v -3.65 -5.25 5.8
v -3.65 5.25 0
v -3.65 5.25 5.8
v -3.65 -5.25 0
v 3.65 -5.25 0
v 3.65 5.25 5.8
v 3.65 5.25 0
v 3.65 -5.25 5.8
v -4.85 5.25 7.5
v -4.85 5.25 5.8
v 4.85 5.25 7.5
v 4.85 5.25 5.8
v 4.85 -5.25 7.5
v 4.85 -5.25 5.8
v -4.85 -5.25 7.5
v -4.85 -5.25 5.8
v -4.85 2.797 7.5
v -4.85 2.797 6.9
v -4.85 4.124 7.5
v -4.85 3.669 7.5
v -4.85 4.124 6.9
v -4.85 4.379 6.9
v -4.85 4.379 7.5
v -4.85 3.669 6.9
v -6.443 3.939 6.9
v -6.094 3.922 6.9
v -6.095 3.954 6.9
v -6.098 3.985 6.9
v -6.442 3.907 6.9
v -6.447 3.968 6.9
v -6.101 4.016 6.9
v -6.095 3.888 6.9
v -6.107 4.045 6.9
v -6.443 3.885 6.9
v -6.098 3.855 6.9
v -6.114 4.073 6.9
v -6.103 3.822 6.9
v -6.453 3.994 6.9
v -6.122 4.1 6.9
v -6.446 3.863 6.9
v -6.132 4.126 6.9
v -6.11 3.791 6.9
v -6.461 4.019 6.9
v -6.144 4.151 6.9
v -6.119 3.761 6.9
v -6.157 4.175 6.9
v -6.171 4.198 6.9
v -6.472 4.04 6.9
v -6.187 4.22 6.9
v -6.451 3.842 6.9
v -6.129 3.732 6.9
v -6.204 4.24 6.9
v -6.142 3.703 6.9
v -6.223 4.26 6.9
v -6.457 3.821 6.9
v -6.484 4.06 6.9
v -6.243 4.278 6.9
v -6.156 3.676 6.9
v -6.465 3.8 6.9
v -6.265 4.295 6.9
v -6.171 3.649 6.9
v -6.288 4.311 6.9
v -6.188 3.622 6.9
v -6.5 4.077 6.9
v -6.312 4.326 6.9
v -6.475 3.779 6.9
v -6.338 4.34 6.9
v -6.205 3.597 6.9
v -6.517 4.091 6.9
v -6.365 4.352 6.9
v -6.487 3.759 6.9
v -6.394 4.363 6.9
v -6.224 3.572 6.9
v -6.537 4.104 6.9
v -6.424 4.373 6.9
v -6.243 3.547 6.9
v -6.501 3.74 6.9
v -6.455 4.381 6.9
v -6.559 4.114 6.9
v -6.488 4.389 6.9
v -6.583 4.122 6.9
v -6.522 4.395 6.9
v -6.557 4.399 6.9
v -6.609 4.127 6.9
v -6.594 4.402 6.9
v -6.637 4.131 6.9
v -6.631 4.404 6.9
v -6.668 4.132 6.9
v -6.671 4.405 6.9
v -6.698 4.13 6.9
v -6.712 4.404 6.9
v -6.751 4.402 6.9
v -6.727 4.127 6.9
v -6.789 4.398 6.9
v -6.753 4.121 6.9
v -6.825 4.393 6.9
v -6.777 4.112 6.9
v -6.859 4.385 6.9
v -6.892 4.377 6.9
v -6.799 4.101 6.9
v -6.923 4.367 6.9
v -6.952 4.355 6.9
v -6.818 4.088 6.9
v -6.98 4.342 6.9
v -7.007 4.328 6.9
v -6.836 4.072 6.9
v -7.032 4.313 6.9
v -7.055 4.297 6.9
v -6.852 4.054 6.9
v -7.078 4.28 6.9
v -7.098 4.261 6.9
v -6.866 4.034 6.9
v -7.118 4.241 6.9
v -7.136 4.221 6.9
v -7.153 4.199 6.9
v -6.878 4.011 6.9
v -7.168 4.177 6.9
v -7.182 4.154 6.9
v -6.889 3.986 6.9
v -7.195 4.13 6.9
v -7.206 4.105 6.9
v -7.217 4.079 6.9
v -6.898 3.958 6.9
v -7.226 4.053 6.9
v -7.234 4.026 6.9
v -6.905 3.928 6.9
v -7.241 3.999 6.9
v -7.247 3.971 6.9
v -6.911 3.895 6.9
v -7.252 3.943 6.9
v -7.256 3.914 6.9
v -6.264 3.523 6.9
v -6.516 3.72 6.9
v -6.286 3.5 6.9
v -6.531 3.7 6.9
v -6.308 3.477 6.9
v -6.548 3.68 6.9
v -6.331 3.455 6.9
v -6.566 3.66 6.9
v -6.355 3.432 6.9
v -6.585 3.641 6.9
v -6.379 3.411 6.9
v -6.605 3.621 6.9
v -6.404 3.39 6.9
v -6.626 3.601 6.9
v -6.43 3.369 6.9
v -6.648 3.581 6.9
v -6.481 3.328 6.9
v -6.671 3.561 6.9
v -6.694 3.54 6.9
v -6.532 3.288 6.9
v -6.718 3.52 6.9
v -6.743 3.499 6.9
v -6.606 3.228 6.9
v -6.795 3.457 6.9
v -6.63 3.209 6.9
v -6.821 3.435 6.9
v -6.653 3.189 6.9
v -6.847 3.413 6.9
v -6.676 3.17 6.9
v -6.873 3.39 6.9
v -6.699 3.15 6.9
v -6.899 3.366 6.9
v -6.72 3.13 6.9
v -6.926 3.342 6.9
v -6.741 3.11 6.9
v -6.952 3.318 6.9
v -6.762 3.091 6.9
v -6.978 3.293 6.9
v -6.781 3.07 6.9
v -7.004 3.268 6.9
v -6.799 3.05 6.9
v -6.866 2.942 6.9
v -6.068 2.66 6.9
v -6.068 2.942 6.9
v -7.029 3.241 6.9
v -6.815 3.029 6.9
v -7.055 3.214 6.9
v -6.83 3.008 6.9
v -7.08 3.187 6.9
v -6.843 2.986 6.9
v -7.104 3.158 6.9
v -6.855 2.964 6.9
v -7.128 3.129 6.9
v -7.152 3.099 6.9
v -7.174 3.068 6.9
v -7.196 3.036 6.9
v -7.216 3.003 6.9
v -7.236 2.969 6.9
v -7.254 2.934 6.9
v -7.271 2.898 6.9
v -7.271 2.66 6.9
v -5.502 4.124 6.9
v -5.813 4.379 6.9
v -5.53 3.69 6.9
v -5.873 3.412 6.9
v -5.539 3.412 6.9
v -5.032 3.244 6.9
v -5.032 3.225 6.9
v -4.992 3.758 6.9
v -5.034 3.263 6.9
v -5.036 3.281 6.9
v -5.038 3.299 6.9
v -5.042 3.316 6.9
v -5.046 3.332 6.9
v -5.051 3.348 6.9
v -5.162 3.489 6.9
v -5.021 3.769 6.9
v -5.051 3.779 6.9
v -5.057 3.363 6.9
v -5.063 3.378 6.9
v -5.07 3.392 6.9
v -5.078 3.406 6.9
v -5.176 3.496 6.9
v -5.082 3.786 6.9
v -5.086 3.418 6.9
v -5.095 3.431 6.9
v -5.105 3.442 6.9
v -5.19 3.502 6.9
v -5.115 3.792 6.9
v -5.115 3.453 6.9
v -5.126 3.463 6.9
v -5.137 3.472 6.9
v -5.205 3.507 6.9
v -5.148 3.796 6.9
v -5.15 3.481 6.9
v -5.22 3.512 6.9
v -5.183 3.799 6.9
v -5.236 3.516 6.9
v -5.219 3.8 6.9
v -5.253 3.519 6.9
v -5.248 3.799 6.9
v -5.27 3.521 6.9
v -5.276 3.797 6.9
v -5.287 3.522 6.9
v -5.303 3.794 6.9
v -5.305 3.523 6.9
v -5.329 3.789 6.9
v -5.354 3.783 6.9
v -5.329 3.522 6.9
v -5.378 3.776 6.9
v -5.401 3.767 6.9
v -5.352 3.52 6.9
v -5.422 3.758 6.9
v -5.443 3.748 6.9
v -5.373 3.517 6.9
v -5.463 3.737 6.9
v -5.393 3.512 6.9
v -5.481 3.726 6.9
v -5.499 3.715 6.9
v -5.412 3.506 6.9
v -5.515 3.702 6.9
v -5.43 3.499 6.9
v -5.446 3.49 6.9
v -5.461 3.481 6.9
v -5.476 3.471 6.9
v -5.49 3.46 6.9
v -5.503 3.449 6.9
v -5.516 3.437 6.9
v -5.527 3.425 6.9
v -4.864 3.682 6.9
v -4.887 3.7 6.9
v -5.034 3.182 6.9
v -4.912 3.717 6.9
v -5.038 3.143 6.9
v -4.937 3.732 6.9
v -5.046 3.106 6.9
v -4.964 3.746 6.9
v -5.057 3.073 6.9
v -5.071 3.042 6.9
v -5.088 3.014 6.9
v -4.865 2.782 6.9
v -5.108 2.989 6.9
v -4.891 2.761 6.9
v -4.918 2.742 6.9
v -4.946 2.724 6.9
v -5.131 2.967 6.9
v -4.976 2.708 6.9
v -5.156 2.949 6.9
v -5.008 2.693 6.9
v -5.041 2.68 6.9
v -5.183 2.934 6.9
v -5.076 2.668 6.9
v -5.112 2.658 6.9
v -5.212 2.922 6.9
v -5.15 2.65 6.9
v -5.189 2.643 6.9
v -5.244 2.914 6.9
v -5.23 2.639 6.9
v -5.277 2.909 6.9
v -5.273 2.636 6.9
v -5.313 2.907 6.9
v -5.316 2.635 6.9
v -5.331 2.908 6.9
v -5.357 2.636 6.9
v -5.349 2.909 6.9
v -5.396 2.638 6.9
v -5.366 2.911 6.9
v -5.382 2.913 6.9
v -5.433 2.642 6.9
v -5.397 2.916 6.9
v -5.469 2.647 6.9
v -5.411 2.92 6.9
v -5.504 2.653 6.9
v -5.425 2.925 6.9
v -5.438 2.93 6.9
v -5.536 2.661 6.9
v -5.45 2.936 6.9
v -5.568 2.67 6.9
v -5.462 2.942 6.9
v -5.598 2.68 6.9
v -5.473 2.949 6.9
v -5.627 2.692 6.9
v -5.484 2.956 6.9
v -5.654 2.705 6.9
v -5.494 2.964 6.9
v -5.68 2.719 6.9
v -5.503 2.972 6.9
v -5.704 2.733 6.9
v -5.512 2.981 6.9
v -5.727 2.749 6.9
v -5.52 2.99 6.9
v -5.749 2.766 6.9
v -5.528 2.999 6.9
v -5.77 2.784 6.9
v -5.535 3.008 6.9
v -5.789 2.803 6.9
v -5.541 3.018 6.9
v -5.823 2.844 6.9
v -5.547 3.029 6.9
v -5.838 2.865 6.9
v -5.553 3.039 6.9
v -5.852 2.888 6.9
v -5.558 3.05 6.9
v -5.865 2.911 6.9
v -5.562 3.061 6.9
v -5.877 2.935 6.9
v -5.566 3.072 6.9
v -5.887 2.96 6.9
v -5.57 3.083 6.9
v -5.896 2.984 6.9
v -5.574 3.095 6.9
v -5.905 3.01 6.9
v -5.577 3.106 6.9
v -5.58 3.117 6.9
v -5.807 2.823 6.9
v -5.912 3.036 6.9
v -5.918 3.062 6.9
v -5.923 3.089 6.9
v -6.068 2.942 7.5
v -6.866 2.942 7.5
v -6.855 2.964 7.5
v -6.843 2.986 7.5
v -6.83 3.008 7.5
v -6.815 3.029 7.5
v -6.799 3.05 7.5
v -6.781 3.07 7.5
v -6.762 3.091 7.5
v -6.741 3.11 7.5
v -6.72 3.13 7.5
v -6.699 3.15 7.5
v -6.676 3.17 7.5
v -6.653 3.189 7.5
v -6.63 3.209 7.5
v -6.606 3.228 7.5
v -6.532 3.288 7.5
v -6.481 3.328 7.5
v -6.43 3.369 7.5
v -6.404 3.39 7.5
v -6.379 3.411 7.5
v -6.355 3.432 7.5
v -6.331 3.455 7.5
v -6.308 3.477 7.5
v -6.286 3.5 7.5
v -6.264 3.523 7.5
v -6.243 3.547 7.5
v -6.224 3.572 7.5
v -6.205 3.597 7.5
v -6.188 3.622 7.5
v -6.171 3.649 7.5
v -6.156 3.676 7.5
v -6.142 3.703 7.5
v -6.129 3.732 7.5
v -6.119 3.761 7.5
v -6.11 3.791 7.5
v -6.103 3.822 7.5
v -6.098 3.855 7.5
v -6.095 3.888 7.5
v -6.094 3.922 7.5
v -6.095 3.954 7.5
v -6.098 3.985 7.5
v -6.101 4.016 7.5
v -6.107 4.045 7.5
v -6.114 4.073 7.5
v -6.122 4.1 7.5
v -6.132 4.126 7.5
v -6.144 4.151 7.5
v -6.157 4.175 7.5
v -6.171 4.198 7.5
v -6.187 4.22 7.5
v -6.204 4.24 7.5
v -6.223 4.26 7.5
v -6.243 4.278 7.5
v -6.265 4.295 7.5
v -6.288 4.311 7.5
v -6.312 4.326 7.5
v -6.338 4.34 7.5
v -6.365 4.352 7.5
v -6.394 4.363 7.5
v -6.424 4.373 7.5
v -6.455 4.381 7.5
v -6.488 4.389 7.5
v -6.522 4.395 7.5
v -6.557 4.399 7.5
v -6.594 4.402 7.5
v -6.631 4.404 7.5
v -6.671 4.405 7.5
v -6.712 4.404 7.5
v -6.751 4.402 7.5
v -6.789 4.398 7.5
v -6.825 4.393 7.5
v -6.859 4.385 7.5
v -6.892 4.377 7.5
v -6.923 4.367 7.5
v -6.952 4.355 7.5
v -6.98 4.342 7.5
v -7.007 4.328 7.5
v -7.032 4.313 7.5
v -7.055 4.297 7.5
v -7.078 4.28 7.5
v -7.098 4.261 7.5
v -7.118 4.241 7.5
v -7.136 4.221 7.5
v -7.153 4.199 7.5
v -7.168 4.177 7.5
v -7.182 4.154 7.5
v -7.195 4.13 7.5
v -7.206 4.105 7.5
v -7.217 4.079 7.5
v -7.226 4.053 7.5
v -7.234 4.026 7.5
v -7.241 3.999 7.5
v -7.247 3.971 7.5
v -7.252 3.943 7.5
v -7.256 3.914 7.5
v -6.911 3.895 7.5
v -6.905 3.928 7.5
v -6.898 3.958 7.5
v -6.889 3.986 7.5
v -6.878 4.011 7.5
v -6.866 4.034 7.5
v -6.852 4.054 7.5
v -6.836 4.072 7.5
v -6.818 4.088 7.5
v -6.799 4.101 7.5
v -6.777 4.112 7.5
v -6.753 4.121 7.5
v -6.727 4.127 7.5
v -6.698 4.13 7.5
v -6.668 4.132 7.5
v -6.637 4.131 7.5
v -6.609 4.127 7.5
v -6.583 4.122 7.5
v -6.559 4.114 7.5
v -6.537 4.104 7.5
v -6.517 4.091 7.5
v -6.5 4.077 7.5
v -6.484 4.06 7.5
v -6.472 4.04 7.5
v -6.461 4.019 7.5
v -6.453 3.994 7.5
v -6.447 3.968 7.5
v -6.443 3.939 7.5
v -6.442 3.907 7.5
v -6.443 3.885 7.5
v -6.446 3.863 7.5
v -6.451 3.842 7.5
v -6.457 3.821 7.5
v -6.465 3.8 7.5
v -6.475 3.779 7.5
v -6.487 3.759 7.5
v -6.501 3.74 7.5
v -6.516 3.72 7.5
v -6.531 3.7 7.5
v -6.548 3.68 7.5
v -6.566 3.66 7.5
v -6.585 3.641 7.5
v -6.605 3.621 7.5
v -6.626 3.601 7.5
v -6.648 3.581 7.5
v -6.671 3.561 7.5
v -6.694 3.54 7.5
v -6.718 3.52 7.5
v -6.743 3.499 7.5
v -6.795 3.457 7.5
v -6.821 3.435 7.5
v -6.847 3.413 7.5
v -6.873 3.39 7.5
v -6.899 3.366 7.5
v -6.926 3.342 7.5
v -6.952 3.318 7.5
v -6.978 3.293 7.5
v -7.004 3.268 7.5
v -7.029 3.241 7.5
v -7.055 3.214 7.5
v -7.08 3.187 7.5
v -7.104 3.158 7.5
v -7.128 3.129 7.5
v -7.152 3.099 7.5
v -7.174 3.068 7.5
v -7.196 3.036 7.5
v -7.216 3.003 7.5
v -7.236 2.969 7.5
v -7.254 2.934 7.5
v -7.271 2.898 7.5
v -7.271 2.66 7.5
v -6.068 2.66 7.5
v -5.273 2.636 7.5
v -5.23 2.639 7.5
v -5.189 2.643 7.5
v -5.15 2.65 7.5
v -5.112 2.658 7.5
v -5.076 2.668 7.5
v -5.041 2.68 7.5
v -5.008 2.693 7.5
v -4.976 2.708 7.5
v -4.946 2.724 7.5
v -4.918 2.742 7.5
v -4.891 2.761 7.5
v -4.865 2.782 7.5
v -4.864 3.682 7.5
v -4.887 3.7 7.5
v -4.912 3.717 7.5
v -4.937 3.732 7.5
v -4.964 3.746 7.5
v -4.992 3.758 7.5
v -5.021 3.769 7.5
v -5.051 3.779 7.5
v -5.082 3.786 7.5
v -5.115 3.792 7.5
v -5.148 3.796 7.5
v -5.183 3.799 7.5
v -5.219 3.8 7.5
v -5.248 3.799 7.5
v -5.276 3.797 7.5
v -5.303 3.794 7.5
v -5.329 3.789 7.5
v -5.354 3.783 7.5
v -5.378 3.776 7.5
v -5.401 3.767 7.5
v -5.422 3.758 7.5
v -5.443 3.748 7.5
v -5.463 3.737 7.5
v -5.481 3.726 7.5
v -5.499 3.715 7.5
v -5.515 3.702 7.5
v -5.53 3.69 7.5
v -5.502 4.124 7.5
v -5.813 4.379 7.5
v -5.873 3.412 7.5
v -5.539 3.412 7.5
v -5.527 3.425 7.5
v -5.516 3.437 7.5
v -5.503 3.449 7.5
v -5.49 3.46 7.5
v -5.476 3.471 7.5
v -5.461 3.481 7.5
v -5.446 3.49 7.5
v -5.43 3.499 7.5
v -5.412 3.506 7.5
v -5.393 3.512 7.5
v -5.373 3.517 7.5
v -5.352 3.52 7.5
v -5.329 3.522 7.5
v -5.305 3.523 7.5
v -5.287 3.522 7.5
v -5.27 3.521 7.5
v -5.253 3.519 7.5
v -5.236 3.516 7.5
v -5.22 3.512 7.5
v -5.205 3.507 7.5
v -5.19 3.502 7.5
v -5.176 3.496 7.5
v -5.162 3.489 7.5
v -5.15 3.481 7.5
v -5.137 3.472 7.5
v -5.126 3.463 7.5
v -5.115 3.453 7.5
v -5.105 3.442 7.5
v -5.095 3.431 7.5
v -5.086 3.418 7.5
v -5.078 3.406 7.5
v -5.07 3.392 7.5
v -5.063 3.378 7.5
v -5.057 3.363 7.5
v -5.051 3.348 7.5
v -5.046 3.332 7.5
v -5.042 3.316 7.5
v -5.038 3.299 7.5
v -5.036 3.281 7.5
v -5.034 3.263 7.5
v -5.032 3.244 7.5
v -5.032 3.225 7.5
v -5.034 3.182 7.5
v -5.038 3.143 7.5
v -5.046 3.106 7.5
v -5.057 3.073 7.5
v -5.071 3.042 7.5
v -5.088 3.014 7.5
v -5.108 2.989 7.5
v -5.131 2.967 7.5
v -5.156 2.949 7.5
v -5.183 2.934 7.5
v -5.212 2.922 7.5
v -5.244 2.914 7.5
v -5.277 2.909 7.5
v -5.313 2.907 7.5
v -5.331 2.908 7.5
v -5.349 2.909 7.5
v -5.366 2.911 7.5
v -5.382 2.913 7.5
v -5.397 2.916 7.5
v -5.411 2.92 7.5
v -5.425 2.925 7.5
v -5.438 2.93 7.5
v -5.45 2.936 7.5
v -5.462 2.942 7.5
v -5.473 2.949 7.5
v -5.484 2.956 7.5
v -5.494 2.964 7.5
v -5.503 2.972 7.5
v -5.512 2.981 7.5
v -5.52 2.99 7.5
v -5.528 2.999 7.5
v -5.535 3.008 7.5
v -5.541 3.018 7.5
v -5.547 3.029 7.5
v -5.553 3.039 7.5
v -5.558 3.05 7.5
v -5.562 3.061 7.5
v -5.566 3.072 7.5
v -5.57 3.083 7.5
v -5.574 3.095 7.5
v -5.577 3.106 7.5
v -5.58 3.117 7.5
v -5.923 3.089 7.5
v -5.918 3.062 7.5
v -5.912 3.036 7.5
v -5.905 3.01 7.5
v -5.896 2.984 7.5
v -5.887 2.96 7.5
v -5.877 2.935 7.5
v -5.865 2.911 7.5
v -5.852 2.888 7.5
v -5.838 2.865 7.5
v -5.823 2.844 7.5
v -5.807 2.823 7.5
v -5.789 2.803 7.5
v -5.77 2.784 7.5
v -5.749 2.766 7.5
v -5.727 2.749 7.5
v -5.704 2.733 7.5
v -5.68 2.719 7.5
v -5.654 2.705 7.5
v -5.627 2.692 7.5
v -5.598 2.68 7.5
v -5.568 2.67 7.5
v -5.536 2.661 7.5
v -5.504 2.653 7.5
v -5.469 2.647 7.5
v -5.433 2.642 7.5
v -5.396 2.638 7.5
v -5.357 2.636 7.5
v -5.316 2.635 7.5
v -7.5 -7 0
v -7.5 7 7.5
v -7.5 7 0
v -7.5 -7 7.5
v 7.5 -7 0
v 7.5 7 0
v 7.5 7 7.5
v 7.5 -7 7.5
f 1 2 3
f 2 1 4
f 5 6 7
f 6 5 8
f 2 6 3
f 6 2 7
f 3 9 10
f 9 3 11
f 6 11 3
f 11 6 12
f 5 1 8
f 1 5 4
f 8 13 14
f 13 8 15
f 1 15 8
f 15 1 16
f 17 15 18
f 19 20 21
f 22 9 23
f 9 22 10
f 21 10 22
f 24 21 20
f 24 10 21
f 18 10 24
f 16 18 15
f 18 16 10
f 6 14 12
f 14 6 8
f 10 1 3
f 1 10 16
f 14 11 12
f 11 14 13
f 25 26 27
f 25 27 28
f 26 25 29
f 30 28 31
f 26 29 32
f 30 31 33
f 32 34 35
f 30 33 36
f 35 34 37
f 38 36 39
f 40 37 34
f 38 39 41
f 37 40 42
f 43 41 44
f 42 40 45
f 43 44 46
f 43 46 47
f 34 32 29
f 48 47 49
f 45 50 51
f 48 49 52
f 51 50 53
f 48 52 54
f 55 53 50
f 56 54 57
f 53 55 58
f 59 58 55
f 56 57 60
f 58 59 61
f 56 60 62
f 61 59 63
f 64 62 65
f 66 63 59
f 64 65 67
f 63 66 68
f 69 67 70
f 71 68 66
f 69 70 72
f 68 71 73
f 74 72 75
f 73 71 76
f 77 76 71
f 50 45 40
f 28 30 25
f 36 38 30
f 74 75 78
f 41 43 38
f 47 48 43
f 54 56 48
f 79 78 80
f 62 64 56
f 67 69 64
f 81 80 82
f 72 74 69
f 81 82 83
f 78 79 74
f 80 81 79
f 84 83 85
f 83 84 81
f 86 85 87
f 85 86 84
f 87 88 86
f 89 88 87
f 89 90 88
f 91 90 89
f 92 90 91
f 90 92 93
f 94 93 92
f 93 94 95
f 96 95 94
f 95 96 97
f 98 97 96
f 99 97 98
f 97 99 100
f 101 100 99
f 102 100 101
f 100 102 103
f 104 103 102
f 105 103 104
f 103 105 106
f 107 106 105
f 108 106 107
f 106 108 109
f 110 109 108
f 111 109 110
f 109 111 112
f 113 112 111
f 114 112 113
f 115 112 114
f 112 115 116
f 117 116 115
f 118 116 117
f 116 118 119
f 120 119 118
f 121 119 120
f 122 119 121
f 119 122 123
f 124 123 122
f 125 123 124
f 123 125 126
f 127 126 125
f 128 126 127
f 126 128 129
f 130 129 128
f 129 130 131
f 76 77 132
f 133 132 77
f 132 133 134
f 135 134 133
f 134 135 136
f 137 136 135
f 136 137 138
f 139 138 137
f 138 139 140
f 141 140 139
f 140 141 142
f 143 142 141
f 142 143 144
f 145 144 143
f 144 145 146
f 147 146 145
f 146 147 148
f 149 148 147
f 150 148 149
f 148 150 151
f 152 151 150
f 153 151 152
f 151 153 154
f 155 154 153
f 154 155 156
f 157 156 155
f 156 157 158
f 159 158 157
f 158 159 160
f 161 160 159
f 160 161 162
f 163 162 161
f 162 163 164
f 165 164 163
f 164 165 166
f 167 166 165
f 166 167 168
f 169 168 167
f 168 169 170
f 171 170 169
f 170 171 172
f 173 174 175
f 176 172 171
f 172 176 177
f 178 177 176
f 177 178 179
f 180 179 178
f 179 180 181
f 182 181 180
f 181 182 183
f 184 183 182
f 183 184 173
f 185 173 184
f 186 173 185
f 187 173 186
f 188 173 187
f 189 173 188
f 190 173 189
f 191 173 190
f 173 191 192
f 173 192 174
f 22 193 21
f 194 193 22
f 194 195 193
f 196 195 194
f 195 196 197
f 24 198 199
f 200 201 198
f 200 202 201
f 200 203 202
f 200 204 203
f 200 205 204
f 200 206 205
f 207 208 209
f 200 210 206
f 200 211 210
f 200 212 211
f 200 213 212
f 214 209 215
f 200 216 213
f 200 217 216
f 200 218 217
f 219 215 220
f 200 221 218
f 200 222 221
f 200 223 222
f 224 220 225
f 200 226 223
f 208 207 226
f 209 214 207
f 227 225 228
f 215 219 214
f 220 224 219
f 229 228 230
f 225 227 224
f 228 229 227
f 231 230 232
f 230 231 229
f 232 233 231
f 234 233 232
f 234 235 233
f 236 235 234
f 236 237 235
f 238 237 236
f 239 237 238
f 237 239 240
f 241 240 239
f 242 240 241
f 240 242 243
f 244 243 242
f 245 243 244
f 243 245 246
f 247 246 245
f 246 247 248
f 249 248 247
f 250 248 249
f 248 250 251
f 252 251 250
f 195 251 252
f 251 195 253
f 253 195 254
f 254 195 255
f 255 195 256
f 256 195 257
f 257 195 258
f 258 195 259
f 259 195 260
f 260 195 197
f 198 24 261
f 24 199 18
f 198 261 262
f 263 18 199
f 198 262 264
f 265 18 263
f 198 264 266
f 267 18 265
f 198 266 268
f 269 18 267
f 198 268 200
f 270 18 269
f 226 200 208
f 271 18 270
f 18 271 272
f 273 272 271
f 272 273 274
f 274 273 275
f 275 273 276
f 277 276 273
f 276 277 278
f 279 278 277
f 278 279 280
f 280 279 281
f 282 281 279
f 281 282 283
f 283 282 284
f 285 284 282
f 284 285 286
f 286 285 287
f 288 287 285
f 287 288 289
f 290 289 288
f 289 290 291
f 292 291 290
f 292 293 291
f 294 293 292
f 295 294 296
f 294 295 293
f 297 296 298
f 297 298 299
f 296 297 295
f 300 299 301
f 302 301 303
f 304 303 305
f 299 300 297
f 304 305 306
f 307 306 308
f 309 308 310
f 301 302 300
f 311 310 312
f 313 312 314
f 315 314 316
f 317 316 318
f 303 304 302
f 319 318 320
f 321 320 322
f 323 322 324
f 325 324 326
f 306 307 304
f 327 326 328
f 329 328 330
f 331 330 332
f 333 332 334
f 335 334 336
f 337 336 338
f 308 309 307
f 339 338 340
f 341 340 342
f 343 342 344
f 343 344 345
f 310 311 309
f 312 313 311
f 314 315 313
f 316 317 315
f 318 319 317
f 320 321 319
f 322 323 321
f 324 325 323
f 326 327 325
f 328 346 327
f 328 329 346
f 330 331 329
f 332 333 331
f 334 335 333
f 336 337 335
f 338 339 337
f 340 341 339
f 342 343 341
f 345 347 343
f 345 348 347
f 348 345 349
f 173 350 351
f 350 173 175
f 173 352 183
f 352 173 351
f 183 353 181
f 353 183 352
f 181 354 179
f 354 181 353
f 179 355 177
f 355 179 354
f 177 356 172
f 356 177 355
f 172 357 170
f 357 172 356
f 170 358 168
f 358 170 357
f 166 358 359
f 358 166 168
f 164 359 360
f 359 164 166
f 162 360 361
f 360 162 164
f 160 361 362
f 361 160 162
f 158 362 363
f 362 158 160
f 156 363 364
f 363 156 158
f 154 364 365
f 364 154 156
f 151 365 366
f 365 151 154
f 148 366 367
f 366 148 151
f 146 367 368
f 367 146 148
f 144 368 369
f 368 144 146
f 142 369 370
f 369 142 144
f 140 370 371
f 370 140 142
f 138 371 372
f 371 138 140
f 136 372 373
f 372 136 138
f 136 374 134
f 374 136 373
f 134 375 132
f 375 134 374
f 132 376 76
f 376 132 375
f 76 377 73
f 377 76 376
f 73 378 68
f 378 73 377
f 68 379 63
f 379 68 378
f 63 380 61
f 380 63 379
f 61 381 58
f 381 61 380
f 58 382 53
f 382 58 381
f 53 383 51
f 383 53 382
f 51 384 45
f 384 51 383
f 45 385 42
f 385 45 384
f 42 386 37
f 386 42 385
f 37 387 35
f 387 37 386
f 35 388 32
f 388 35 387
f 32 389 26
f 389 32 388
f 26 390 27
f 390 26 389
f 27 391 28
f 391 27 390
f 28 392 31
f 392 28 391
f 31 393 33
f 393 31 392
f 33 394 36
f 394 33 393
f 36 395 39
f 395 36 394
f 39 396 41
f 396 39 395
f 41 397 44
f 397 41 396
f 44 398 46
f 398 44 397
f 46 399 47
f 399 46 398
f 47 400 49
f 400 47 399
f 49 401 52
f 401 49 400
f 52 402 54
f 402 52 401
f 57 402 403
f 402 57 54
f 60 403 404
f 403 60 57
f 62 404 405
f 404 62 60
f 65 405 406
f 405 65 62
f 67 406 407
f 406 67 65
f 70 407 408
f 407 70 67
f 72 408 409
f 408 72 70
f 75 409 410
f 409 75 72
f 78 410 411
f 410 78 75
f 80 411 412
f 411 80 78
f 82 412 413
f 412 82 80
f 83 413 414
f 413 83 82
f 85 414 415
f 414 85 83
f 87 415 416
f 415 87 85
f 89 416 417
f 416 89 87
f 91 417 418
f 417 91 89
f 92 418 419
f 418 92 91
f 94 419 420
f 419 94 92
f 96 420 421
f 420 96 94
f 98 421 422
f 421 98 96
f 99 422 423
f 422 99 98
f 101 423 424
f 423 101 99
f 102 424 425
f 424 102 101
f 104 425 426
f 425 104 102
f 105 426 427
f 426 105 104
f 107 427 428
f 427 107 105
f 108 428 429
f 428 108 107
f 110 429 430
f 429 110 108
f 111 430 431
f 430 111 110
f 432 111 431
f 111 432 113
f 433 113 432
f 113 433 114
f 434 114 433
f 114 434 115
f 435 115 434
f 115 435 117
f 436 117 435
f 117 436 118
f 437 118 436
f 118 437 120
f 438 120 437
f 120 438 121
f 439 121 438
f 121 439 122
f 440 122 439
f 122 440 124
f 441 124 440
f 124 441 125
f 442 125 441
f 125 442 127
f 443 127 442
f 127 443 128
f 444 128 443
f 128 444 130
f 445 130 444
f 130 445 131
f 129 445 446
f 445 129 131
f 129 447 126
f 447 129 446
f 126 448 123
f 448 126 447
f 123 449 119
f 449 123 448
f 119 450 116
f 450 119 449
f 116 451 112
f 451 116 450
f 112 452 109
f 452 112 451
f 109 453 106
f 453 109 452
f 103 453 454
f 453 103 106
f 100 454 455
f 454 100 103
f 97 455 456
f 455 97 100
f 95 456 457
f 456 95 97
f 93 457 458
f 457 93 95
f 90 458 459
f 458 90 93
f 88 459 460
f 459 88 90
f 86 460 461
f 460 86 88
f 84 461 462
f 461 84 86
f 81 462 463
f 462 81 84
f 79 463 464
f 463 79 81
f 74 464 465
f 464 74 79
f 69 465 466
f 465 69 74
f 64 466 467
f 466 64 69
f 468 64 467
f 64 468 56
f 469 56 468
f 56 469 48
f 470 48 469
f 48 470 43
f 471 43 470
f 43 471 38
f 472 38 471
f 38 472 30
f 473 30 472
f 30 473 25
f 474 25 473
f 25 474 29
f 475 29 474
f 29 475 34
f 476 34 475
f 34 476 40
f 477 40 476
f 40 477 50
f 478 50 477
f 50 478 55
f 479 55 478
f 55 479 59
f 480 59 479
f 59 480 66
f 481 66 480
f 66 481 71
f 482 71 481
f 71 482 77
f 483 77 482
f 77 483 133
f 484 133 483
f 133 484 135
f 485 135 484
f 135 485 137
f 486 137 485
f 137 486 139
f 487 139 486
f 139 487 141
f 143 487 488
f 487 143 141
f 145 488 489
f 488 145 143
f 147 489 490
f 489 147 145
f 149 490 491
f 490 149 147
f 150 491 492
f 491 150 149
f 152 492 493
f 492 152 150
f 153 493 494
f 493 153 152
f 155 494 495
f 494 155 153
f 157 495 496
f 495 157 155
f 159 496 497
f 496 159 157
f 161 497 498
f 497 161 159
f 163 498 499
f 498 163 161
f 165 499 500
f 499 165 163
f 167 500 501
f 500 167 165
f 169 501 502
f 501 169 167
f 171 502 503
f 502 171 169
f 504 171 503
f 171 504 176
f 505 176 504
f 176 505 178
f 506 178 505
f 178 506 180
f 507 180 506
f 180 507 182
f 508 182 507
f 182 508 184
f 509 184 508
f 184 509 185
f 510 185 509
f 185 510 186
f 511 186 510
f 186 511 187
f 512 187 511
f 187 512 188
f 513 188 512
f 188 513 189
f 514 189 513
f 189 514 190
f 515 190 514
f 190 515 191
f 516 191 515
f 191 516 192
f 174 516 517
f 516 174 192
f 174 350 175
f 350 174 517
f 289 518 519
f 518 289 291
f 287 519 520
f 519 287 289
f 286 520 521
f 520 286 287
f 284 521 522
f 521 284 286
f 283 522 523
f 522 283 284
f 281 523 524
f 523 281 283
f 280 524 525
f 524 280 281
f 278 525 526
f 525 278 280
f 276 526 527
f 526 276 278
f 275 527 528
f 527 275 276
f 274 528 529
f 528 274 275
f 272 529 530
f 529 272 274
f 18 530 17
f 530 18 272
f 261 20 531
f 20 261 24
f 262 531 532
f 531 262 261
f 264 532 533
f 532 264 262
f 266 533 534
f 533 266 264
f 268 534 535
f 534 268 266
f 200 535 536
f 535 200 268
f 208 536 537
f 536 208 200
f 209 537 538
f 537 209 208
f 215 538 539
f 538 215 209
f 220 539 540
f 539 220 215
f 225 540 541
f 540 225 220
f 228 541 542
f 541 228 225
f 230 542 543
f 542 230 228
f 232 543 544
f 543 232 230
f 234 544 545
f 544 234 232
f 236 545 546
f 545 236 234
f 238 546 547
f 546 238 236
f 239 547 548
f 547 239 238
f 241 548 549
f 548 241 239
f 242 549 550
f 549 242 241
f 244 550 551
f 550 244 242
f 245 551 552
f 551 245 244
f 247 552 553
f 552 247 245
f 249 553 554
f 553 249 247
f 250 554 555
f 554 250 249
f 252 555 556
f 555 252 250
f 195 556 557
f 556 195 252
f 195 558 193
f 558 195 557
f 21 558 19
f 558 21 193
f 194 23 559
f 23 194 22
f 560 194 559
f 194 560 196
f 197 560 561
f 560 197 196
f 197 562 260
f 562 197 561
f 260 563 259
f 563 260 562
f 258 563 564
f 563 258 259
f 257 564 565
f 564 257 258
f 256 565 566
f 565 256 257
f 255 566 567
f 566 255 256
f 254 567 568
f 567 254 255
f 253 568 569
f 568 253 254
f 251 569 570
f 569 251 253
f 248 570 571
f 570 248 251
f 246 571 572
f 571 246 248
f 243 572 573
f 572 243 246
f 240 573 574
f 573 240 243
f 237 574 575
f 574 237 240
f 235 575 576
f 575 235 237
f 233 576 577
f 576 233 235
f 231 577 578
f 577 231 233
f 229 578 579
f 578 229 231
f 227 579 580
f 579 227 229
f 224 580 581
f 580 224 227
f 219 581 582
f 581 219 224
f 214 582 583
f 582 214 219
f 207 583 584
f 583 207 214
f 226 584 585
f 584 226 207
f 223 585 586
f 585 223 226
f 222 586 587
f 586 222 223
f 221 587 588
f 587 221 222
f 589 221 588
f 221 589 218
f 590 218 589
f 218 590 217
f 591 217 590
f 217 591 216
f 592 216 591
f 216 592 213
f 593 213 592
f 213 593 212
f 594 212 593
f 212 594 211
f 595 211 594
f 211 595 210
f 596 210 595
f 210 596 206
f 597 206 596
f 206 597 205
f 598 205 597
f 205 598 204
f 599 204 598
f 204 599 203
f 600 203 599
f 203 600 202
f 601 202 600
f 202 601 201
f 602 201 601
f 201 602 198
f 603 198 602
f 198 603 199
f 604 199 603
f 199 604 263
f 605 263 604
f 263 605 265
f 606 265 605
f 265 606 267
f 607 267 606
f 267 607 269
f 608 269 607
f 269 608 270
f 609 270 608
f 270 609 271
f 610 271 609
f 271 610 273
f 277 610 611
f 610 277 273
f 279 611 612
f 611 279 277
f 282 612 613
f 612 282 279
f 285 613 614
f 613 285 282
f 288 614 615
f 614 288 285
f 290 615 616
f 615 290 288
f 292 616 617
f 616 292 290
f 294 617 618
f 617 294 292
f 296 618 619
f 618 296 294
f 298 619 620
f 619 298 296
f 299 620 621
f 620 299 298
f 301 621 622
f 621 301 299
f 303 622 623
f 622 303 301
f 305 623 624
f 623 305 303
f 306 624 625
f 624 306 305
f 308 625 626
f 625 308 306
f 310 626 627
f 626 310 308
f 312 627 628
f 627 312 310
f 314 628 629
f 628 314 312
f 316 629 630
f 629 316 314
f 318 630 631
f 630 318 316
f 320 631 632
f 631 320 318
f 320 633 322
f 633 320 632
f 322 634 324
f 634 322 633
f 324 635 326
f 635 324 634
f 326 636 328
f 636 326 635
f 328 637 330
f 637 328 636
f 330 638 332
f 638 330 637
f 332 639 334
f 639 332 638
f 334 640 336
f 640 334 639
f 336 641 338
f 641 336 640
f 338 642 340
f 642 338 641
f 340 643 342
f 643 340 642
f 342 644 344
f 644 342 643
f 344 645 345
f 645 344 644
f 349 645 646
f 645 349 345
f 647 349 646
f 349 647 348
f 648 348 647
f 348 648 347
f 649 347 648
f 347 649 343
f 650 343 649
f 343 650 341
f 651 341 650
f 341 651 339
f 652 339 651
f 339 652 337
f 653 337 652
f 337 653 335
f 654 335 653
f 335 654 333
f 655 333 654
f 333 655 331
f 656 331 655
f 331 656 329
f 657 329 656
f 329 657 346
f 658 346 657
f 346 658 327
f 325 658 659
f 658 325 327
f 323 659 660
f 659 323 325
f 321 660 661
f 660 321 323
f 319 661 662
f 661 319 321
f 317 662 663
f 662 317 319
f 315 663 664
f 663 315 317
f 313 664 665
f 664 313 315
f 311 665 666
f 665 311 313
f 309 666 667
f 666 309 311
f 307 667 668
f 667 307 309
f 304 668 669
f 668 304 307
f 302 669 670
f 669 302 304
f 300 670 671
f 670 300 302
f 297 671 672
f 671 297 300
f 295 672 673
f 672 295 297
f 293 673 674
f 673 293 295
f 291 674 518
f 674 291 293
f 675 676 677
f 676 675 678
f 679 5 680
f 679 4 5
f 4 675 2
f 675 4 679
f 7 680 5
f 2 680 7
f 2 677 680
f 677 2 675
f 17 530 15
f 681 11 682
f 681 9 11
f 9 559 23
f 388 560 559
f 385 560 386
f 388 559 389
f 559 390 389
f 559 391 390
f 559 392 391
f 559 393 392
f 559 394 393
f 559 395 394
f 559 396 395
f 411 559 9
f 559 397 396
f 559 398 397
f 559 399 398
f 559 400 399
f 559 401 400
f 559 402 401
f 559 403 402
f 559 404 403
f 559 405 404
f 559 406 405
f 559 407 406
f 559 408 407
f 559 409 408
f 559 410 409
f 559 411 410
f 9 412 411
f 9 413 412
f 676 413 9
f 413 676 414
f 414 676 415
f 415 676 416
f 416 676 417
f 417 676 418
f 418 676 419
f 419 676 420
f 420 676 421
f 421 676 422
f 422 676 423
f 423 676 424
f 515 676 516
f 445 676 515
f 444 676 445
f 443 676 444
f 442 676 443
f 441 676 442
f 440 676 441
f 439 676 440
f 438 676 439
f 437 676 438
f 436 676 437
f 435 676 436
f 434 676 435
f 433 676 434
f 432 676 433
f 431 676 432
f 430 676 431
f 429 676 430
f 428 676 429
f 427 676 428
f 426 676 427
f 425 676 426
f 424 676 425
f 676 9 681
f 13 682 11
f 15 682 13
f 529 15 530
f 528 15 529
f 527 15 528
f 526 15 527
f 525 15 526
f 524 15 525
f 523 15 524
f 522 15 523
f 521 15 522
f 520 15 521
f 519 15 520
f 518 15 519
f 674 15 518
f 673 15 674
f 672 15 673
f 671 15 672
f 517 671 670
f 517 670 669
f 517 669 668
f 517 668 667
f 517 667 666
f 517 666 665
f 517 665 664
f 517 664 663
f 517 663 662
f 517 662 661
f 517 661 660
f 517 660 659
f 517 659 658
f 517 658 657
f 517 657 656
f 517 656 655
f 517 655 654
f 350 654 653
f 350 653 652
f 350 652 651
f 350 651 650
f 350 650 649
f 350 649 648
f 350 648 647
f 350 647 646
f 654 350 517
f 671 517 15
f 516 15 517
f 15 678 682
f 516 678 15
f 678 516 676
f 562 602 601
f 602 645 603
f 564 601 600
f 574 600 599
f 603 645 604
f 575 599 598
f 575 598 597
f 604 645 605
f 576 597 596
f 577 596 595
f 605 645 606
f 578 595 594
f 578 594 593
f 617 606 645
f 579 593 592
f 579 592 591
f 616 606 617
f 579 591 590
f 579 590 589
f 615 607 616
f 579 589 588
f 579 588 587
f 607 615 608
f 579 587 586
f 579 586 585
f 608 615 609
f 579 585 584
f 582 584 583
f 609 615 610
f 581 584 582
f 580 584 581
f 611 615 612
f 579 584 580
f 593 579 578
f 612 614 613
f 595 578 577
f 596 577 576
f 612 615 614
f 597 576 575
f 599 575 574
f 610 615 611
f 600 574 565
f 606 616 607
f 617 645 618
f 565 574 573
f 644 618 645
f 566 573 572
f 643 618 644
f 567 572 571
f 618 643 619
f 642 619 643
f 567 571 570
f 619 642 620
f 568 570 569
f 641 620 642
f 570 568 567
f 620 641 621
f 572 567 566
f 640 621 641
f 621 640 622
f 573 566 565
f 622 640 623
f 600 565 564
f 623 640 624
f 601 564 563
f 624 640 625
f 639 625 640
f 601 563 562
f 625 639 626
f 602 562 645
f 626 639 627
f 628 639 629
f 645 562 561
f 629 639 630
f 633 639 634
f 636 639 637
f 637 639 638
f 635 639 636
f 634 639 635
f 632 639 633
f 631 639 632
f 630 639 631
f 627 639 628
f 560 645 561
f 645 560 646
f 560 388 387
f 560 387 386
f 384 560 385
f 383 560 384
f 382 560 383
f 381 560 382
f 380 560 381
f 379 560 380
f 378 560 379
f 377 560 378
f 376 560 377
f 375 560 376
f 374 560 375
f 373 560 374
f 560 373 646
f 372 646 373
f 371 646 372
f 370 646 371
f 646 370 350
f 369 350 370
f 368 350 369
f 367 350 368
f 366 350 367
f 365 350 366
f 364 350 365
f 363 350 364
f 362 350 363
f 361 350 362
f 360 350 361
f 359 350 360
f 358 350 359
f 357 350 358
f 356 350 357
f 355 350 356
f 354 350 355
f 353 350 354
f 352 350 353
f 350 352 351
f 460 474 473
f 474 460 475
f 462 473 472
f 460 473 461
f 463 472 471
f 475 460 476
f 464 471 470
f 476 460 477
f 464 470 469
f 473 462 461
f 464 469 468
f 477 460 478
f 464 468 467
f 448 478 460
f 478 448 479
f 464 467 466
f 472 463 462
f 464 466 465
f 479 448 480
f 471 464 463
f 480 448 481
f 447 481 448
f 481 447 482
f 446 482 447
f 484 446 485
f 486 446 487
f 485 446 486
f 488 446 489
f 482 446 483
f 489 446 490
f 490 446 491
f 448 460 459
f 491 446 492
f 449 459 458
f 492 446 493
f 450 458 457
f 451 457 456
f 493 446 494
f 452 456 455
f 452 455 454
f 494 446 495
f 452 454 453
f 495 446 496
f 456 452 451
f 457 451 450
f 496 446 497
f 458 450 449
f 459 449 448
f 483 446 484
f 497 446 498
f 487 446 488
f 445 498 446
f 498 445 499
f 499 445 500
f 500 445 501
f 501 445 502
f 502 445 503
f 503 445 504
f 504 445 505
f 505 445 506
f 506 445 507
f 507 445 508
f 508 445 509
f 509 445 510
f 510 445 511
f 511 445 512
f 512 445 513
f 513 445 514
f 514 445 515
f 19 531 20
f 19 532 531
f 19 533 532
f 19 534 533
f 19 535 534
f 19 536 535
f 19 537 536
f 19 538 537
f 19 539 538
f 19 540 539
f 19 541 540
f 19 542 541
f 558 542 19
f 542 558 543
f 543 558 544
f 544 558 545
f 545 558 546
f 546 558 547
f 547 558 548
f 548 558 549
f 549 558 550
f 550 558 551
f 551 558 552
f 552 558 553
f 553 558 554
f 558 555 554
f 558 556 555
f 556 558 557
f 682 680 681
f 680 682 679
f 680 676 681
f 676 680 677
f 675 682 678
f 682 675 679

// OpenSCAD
$fn = 50;

difference() {
	union() {
		translate(v = [0, -5, 7.5]) {
			rotate(a = [0, 180, 0]) {
				difference() {
					union() {
						translate(v = [-7.5, -2.0, 0]) {
							cube(size = [15.0, 14.0, 7.5]);
						}
					}
					union() {
						translate(v = [-3.65, -0.25, -0.1]) {
							cube(size = [7.3, 10.5, 7.7]);
						}
						translate(v = [-4.85, -0.25, -0.1]) {
							cube(size = [9.7, 10.5, 1.8]);
						}
						translate(v = [6, 8.5, 0.6]) {
							rotate(a = [0, 180, 0]) {
								linear_extrude(height = 0.7) {
									text(font = "Arial:style=Bold", halign = "center", size = 1.8, text = "25", valign = "center");
								}
							}
						}
					}
				}
			}
		}
	}
	union();
}
